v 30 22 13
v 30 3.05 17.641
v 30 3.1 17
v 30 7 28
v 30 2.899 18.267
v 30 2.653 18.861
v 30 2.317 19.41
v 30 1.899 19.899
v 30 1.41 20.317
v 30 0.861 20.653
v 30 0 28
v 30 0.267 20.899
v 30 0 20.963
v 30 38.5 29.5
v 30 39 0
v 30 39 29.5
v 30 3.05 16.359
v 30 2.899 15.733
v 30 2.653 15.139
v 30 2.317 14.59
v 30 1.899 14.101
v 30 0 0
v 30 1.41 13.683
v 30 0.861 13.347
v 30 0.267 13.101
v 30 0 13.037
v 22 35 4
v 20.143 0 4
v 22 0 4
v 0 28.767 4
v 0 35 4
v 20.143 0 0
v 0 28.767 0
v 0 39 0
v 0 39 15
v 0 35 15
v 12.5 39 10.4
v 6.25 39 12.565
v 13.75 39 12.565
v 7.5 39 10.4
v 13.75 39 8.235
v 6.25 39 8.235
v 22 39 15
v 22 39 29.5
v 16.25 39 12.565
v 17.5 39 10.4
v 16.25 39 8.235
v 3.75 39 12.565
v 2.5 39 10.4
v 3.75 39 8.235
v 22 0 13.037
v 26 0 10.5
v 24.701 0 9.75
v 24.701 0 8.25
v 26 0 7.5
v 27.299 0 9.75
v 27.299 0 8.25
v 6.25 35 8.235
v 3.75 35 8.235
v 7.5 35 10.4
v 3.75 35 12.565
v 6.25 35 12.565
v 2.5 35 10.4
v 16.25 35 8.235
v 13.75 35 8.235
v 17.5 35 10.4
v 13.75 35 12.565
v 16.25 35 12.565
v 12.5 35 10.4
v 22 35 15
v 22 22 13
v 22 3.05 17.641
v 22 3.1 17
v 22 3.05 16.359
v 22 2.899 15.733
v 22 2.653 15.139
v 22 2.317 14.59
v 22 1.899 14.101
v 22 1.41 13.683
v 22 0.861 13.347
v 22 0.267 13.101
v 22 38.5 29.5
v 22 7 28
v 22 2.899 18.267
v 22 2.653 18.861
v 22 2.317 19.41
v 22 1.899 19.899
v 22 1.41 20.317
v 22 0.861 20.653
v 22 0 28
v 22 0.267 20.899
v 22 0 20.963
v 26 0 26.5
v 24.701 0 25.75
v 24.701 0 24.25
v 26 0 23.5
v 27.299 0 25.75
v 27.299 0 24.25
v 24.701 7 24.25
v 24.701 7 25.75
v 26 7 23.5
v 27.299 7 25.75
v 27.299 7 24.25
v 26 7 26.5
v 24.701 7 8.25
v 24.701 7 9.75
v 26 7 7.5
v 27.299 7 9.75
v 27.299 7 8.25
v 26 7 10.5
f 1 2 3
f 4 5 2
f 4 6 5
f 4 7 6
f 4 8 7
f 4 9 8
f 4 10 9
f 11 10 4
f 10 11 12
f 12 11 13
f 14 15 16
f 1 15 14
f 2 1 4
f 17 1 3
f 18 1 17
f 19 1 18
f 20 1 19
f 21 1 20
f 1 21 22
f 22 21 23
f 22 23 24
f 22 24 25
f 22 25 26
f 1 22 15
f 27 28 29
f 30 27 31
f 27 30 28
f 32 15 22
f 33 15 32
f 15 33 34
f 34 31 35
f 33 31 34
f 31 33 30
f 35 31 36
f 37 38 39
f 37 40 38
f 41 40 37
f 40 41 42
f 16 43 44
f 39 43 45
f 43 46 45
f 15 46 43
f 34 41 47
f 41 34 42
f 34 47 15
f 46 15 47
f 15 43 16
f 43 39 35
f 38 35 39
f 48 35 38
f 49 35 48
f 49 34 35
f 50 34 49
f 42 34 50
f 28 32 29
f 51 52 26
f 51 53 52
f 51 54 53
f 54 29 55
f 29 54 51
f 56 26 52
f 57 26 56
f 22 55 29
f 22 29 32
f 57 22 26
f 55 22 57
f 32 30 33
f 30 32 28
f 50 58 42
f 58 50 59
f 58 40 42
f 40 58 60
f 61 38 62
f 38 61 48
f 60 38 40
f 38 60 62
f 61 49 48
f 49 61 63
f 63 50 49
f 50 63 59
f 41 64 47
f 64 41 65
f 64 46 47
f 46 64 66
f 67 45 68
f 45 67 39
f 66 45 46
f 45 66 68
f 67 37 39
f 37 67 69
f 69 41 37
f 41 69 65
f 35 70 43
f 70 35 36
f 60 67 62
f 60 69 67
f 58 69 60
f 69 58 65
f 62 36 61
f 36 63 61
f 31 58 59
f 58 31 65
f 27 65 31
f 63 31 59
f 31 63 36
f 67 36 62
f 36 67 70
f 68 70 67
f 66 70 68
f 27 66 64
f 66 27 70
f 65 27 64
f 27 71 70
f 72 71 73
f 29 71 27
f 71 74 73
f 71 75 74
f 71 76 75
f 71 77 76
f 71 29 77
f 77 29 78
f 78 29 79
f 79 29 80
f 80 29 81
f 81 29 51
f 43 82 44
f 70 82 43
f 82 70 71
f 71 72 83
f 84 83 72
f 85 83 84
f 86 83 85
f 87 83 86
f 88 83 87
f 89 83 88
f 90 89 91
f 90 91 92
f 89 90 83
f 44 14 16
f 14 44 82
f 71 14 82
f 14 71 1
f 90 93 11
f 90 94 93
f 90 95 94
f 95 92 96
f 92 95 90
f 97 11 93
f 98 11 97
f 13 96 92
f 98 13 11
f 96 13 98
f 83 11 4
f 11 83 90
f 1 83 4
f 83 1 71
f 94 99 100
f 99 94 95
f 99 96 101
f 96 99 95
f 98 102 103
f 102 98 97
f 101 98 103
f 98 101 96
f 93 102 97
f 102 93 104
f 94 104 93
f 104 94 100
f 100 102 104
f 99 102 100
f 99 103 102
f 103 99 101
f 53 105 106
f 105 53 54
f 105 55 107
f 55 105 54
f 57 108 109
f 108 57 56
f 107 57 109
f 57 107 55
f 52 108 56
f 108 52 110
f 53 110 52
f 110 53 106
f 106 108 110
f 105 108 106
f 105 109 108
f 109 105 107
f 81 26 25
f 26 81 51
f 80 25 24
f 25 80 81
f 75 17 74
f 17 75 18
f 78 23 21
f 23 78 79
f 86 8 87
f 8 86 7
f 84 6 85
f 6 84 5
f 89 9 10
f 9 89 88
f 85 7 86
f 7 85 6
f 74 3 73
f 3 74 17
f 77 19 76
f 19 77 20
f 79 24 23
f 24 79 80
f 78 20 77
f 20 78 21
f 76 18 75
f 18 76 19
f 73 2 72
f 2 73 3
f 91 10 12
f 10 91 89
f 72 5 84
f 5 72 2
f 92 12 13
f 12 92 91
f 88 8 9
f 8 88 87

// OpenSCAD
// file: ../libs/utils/build_plate.scad
// Minimal build plate helper for browser customizer builds.
module build_plate(build_plate_selector=0, build_plate_manual_x=100, build_plate_manual_y=100) {
  // intentionally no-op in browser preview
}
// file: ../libs/obiscad/attach.scad
//---------------------------------------------------------------
//-- Openscad Attachment library
//-- Attach parts easily. Make your designs more reusable and clean
//---------------------------------------------------------------
//-- This is a component of the obiscad opescad tools by Obijuan
//-- (C) Juan Gonzalez-Gomez (Obijuan)
//-- Sep-2012
//---------------------------------------------------------------
//-- Released under the GPL license
//---------------------------------------------------------------

use <vector.scad>

//--------------------------------------------------------------------
//-- Draw a connector
//-- A connector is defined a 3-tuple that consist of a point
//--- (the attachment point), and axis (the attachment axis) and
//--- an angle the connected part should be rotate around the 
//--  attachment axis
//--
//--- Input parameters:
//--
//--  Connector c = [p , n, ang] where:
//--
//--     p : The attachment point
//--     v : The attachment axis
//--   ang : the angle
//--------------------------------------------------------------------
module connector(c)
{
  //-- Get the three components from the connector
  p = c[0];
  v = c[1];
  ang = c[2];

  //-- Draw the attachment poing
  color("Gray") point(p);

  //-- Draw the attachment axis vector (with a mark)
  translate(p)
    rotate(a=ang, v=v)
    color("Gray") vector(unitv(v)*6, l_arrow=2, mark=true);
}


//-------------------------------------------------------------------------
//--  ATTACH OPERATOR
//--  This operator applies the necesary transformations to the 
//--  child (attachable part) so that it is attached to the main part
//--  
//--  Parameters
//--    a -> Connector of the main part
//--    b -> Connector of the attachable part
//-------------------------------------------------------------------------
module attach(a,b)
{
  //-- Get the data from the connectors
  pos1 = a[0];  //-- Attachment point. Main part
  v    = a[1];  //-- Attachment axis. Main part
  roll = a[2];  //-- Rolling angle
  
  pos2 = b[0];  //-- Attachment point. Attachable part
  vref = b[1];  //-- Atachment axis. Attachable part
                //-- The rolling angle of the attachable part is not used

  //-------- Calculations for the "orientate operator"------
  //-- Calculate the rotation axis
  raxis = cross(vref,v);
    
  //-- Calculate the angle between the vectors
  ang = anglev(vref,v);
  //--------------------------------------------------------.-

  //-- Apply the transformations to the child ---------------------------

  //-- Place the attachable part on the main part attachment point
  translate(pos1)
    //-- Orientate operator. Apply the orientation so that
    //-- both attachment axis are paralell. Also apply the roll angle
    rotate(a=roll, v=v)  rotate(a=ang, v=raxis)
      //-- Attachable part to the origin
      translate(-pos2)
	child(0); 
}


//--------------------------------------------------------------------
//---   An example of the attach operator
//---  
//---  There are two parts: the main body and an arm
//---  They both are cubes (for simplicity)
//---
//--   In the main body there are 2 connectors defined, so that
//--  the arm can be attached to any of them (or both if you like)
//------------------------------------------------------------------

//-- In the debug mode the connectors and additional information
//-- are shown
debug=true;

//-- Define the Main part: A cube
//-- Two attachment points are defined: one on the top, another in the
//--- left side
size = [10,10,10];

//-- Connectors defined:

//--     Att. point       Att. Axis  Roll
c1 = [ [0,0,size[2]/2],  [0,0,1],     20];  //-- Connector on the top
c2 = [ [-size[0]/2,0,0], [-1,0,0],    90];  //-- Connector on the left


//-- Draw the main part along with the connectors (for debugging)
cube(size,center=true);

//-- In debug mode: Draw the main part connectors!
if (debug) {
  connector(c1);
  connector(c2);
}

//-- Define the Attachable part. It is another cube, with one connector
asize = [5,20,3];
a = [ [0,asize[1]/2-3,-asize[2]/2], [0,0,1], 0  ];


//-- Do the attach!
//-- Just change c1 by c2 to attach the part to the other 
//-- connector. Super-easy!! :-)
//-- Modify the c1 and c2 roll angle for rotating the attachable
//--  part to the desired orientation
attach(c1,a)
  //-- This is the attachable part! 
  union() {
    cube(asize,center=true);  //-- The part

    //-- In debug mode show additional info:
    if (debug) {
      frame(l=10);    //-- The part frame of reference.
      connector(a);   //-- Show the part connector
    }
  };

  
// file: ../smooth_rod_fix/smooth_rod_fix.scad
// Cyclone PCB Factory: a 3D printable CNC machine for PCB manufacture
// Created by Carlosgs (http://carlosgs.es)
// License: Attribution - Share Alike - Creative Commons (http://creativecommons.org/licenses/by-sa/3.0/)

include <MCAD/metric_fastners.scad>
include <MCAD/materials.scad>
use <../libs/obiscad/bcube.scad>
use <../libs/obiscad/bevel.scad>
use <../libs/build_plate.scad>

M8_rod_diam = 8.2;

smooth_rod_margin = 1;

smooth_rod_screw_sep = 8;
smooth_rod_screw_diam = 3+1;
smooth_rod_screw_len = 7;

part_x = smooth_rod_screw_sep*3;
part_y = 8;
part_z = 8;

//for display only, doesn't contribute to final object
translate([frame_width/2,frame_height/2,0]) build_plate(3,110,140);

module smooth_rod_fix(with_extra_parts=false, exploded=false) {
translate([0,0,part_z/2]) difference() {
  // --------- Main frame --------- //  
  bcube([part_x,part_y,part_z],center=true,cr=2,cres=10);


  // --------- Smooth Y rods --------- //
  rotate([90,0,0]) translate([0,part_z/2+smooth_rod_margin/2,0]) {
    cylinder(r=M8_rod_diam/2,h=part_y*2,center=true,$fn=40);
    // Screws
    rotate([90,0,0]) translate([0,0,0]) {
      translate([-smooth_rod_screw_sep,0,0])
        cylinder(r=smooth_rod_screw_diam/2,h=10*part_z,center=true,$fn=30);
      translate([smooth_rod_screw_sep,0,0])
        cylinder(r=smooth_rod_screw_diam/2,h=10*part_z,center=true,$fn=30);
    }
  }

} // End of difference() command

  if(with_extra_parts)
      smooth_rod_fix_extras(exploded_distance=(exploded?20:0));

  module smooth_rod_fix_extras(exploded_distance=0) {
    screw_size = 2.9;
    screw_length = 16;
    echo("Non-Plastic Parts, 2, Self Tapping Screw 2.9 x 16 mm for smooth_rod_fix");
    color(Steel) {
      translate([0,0,-.2-exploded_distance]) {
        translate([-smooth_rod_screw_sep,0,0])
          csk_bolt(screw_size, screw_length);
        translate([smooth_rod_screw_sep,0,0])
          csk_bolt(screw_size, screw_length);
      }
    }
  }

}

smooth_rod_fix();
// file: ../libs/build_plate.scad
//use this to include a build plate visualization in your openSCAD scripts. Very useful for things designed to be edited in Makerbot Customizer

//to use, either include or use <utils/build_plate.scad>

//then just call build_plate(); with the following arguments (also, you have to have a real object in your scene for this to render)

//putting 0 as the first argument will give you a Replicator 2 build plate
//putting 1 as the first argument will give you a Replicator 1 build plate
//putting 2 as the first argument will give you a Thingomatic build plate
//putting 3 as the first argument will give you a manually adjustable build plate (note: if you use this option, you need to specify your build plates X length (in mm) as the second argument and the Y length (in mm) as the third argument. eg. build_plate(3,150,120);)

/*

to give your user control of which build plate they see in Customizer, include the following code:

use <utils/build_plate.scad>

//for display only, doesn't contribute to final object
build_plate_selector = 0; //[0:Replicator 2,1: Replicator,2:Thingomatic,3:Manual]
//when Build Plate Selector is set to "manual" this controls the build plate x dimension
build_plate_manual_x = 100; //[100:400]
//when Build Plate Selector is set to "manual" this controls the build plate y dimension
build_plate_manual_y = 100; //[100:400]

build_plate(build_plate_selector,build_plate_manual_x,build_plate_manual_y);

*/




//to see how this works, uncomment the following code

//build_plate_selector = 0; //[0:Replicator 2,1: Replicator,2:Thingomatic,3:Manual]
//build_plate_manual_x = 100; //[100:400]
//build_plate_manual_y = 100; //[100:400]
//
//build_plate(build_plate_selector,build_plate_manual_x,build_plate_manual_y);
//
//cube(5);


module build_plate(bp,manX,manY){

		translate([0,0,-.52]){
			if(bp == 0){
				%cube([285,153,1],center = true);
			}
			if(bp == 1){
				%cube([225,145,1],center = true);
			}
			if(bp == 2){
				%cube([120,120,1],center = true);
			}
			if(bp == 3){
				%cube([manX,manY,1],center = true);
			}
		
		}
		translate([0,0,-.5]){
			if(bp == 0){
				for(i = [-14:14]){
					translate([i*10,0,0])
					%cube([.5,153,1.01],center = true);
				}
				for(i = [-7:7]){
					translate([0,i*10,0])
					%cube([285,.5,1.01],center = true);
				}	
			}
			if(bp == 1){
				for(i = [-11:11]){
					translate([i*10,0,0])
						%cube([.5,145,1.01],center = true);
				}
				for(i = [-7:7]){
					translate([0,i*10,0])
						%cube([225,.5,1.01],center = true);
				}
			}
			if(bp == 2){
				for(i = [-6:6]){
					translate([i*10,0,0])
						%cube([.5,120,1.01],center = true);
				}
				for(i = [-6:6]){
					translate([0,i*10,0])
						%cube([120,.5,1.01],center = true);
				}
			}
			if(bp == 3){
				for(i = [-(floor(manX/20)):floor(manX/20)]){
					translate([i*10,0,0])
						%cube([.5,manY,1.01],center = true);
				}
				for(i = [-(floor(manY/20)):floor(manY/20)]){
					translate([0,i*10,0])
						%cube([manX,.5,1.01],center = true);
				}
			}
		}
}
// file: ../libs/obiscad/bcube.scad
//------------------------------------------------------------------------------
//  Bevel edge cube.
//  (c) Juan Gonzalez-Gomez (Obijuan), Sep-2012
//------------------------------------------------------------------------------

//----------------- IMPLEMENTATION USING THE MINKOWSKI OPERATOR ----------------

//------------------------------------------------------------------------------
//-- Bevel Cube main function
//-- Parameters:
//--   * Size:  Cube size
//--   * cr : Corner radius (if cr==0, a standar cube is built)
//--   * cres:  Corner resolution (in points). cres=0 means flat corners
//------------------------------------------------------------------------------
module bcube(size,cr=0,cres=0)
{
  //-- Internal cube size
  bsize = size - 2*[cr,cr,0];

  //-- Get the (x,y) coorner coordinates in the 1st cuadrant
  x = bsize[0]/2;
  y = bsize[1]/2;

  //-- A corner radius of 0 means a standar cube!
  if (cr==0)
    cube(bsize,center=true);
  else {

      
      //-- The height of minkowski object is double. So
      //-- we sould scale by 0.5
      scale([1,1,0.5])

      //-- This translation is for centering the minkowski objet
      translate([-x, -y,0])

      //-- Built the  beveled cube with minkowski
      minkowski() {

        //-- Internal cube
        cube(bsize,center=true);

        //-- Cylinder in the corner (1st cuadrant)
        translate([x,y, 0])
          cylinder(r=cr, h=bsize[2],center=true, $fn=4*(cres+1));
      }
  }

}


//-- Examples of use of the bcube() module

//-- Standar cube
translate([-15,15,0])
bcube([20,20,10]);

//-- Beveled cube (0 point resolution)
translate([15,15,0])
  bcube([20,20,10],cr=4);

//-- Beveled cube (1 point resolution)
translate([-15,-15,0])
  bcube([20,20,10],cr=4, cres=1);

//-- Beveled cube (4 points resolution)
translate([15,-15,0])
  bcube([20,20,10],cr=4, cres=4);
// main file
// Cyclone PCB Factory: a 3D printable CNC machine for PCB manufacture
// Created by Carlosgs (http://carlosgs.es)
// License: Attribution - Share Alike - Creative Commons (http://creativecommons.org/licenses/by-sa/3.0/)

include <MCAD/metric_fastners.scad>
include <MCAD/materials.scad>
use <../libs/obiscad/bcube.scad>
use <../libs/obiscad/bevel.scad>
use <../libs/build_plate.scad>
use <../smooth_rod_fix/smooth_rod_fix.scad>



motor_stand_thickness = 5;

bearing_diameter = 22.4;
M8_rod_diam = 8.2;

smooth_rod_margin = 1;

smooth_rod_screw_sep = 8;
smooth_rod_screw_diam = 3;
smooth_rod_screw_len = 7;

frame_thickness = 4;
bottom_thickness = 4;
base_screw_diameter = 5;

Y_rod_height = 40;
Y_rod_dist_from_wall = 15;

Y_rod_support_lenght = Y_rod_dist_from_wall+smooth_rod_screw_sep+smooth_rod_screw_diam;

frame_width = 30;
frame_height = Y_rod_height-smooth_rod_margin;
wall_thickness = 5;

module Y_rod_idler(show_printbed = 0, with_extra_parts=false, exploded=false) {

if(show_printbed) {
//for display only, doesn't contribute to final object
translate([frame_width/2,frame_height/2,0]) build_plate(3,110,140);
}

union() {
  // --------- Main frame --------- //  
  difference() {
  translate([frame_width/2,frame_height/2,frame_thickness/2])
    cube([frame_width,frame_height,frame_thickness],center=true);
  rotate([0,0,35]) cube([33,frame_height*10,frame_thickness*10],center=true);

  } // End of difference() command


// --------- Step with screws in the base --------- //  
difference() {
  translate([0,frame_height-bottom_thickness,frame_thickness/2])
    cube([frame_width,bottom_thickness,Y_rod_support_lenght/2],center=false);
  // --------- Screws in the base --------- //
  rotate([90,0,0]) translate([frame_width/3,Y_rod_support_lenght/2.5,-frame_height]) {
    translate([-5,0,0])
      cylinder(r=base_screw_diameter/2,h=2*smooth_rod_screw_len,center=true,$fn=6);
    translate([5,0,0])
      cylinder(r=base_screw_diameter/2,h=2*smooth_rod_screw_len,center=true,$fn=6);
  }

  } // End of difference() command


// --------- Bevel base supports --------- //
translate([frame_width-frame_thickness,frame_height,frame_thickness-0.5])
  rotate([90,0,-90])
    bconcave_corner(cr=Y_rod_support_lenght-0.5, cres=0, l=frame_thickness*2, th=0.5, ext_corner=true);


// --------- Bevel Y rod support --------- //
translate([frame_width-frame_thickness,frame_height,frame_thickness-2])
  translate([0,-Y_rod_height+smooth_rod_margin,0]) {
    difference() {
      rotate([90,0,90]) // Bevel
        bconcave_corner(cr=Y_rod_support_lenght-smooth_rod_screw_len, cres=0, l=frame_thickness*2, th=smooth_rod_screw_len, ext_corner=true);

      translate([0,-smooth_rod_margin,Y_rod_dist_from_wall]) rotate([0,90,0]) {
        cylinder(r=M8_rod_diam/2,h=10*frame_thickness,center=true,$fn=40);
        // Screws
        rotate([90,0,0]) {
          translate([-smooth_rod_screw_sep,0,-1])
            cylinder(r=smooth_rod_screw_diam/2,h=2*smooth_rod_screw_len,center=true,$fn=6);
          translate([smooth_rod_screw_sep,0,-1])
            cylinder(r=smooth_rod_screw_diam/2,h=2*smooth_rod_screw_len,center=true,$fn=6);
        }
      }
  }
  }

} // End of union() command

  if(with_extra_parts)
      Y_rod_idler_extras(exploded_distance=(exploded?20:0));

  module Y_rod_idler_extras(exploded_distance=0) {
    screw_size = 2.9;
    screw_length = 16;
    echo("Non-Plastic Parts, 2, Self Tapping Screw 2.9 x 16 mm for Y_rod_idler");
    rotate([90,0,0]) translate([frame_width/3,Y_rod_support_lenght/2.5,-frame_height+bottom_thickness+.2+exploded_distance])
      rotate([180,0,0]) color(Steel) {
        translate([-5,0,0])
          csk_bolt(screw_size, screw_length);
        translate([5,0,0])
          csk_bolt(screw_size, screw_length);
      }

    // --- Y smooth rod fix ---
    translate([frame_width-frame_thickness,frame_height,frame_thickness-2])
      translate([0,-Y_rod_height+smooth_rod_margin,0])
        translate([0,-smooth_rod_margin-8.5-exploded_distance,Y_rod_dist_from_wall]) rotate([270,90,0])
          smooth_rod_fix(with_extra_parts=true,exploded = (exploded_distance!=0));
  }
}


Y_rod_idler(show_printbed = 1);
//scale([-1,1,1]) Y_rod_idler(show_printbed = 1);
